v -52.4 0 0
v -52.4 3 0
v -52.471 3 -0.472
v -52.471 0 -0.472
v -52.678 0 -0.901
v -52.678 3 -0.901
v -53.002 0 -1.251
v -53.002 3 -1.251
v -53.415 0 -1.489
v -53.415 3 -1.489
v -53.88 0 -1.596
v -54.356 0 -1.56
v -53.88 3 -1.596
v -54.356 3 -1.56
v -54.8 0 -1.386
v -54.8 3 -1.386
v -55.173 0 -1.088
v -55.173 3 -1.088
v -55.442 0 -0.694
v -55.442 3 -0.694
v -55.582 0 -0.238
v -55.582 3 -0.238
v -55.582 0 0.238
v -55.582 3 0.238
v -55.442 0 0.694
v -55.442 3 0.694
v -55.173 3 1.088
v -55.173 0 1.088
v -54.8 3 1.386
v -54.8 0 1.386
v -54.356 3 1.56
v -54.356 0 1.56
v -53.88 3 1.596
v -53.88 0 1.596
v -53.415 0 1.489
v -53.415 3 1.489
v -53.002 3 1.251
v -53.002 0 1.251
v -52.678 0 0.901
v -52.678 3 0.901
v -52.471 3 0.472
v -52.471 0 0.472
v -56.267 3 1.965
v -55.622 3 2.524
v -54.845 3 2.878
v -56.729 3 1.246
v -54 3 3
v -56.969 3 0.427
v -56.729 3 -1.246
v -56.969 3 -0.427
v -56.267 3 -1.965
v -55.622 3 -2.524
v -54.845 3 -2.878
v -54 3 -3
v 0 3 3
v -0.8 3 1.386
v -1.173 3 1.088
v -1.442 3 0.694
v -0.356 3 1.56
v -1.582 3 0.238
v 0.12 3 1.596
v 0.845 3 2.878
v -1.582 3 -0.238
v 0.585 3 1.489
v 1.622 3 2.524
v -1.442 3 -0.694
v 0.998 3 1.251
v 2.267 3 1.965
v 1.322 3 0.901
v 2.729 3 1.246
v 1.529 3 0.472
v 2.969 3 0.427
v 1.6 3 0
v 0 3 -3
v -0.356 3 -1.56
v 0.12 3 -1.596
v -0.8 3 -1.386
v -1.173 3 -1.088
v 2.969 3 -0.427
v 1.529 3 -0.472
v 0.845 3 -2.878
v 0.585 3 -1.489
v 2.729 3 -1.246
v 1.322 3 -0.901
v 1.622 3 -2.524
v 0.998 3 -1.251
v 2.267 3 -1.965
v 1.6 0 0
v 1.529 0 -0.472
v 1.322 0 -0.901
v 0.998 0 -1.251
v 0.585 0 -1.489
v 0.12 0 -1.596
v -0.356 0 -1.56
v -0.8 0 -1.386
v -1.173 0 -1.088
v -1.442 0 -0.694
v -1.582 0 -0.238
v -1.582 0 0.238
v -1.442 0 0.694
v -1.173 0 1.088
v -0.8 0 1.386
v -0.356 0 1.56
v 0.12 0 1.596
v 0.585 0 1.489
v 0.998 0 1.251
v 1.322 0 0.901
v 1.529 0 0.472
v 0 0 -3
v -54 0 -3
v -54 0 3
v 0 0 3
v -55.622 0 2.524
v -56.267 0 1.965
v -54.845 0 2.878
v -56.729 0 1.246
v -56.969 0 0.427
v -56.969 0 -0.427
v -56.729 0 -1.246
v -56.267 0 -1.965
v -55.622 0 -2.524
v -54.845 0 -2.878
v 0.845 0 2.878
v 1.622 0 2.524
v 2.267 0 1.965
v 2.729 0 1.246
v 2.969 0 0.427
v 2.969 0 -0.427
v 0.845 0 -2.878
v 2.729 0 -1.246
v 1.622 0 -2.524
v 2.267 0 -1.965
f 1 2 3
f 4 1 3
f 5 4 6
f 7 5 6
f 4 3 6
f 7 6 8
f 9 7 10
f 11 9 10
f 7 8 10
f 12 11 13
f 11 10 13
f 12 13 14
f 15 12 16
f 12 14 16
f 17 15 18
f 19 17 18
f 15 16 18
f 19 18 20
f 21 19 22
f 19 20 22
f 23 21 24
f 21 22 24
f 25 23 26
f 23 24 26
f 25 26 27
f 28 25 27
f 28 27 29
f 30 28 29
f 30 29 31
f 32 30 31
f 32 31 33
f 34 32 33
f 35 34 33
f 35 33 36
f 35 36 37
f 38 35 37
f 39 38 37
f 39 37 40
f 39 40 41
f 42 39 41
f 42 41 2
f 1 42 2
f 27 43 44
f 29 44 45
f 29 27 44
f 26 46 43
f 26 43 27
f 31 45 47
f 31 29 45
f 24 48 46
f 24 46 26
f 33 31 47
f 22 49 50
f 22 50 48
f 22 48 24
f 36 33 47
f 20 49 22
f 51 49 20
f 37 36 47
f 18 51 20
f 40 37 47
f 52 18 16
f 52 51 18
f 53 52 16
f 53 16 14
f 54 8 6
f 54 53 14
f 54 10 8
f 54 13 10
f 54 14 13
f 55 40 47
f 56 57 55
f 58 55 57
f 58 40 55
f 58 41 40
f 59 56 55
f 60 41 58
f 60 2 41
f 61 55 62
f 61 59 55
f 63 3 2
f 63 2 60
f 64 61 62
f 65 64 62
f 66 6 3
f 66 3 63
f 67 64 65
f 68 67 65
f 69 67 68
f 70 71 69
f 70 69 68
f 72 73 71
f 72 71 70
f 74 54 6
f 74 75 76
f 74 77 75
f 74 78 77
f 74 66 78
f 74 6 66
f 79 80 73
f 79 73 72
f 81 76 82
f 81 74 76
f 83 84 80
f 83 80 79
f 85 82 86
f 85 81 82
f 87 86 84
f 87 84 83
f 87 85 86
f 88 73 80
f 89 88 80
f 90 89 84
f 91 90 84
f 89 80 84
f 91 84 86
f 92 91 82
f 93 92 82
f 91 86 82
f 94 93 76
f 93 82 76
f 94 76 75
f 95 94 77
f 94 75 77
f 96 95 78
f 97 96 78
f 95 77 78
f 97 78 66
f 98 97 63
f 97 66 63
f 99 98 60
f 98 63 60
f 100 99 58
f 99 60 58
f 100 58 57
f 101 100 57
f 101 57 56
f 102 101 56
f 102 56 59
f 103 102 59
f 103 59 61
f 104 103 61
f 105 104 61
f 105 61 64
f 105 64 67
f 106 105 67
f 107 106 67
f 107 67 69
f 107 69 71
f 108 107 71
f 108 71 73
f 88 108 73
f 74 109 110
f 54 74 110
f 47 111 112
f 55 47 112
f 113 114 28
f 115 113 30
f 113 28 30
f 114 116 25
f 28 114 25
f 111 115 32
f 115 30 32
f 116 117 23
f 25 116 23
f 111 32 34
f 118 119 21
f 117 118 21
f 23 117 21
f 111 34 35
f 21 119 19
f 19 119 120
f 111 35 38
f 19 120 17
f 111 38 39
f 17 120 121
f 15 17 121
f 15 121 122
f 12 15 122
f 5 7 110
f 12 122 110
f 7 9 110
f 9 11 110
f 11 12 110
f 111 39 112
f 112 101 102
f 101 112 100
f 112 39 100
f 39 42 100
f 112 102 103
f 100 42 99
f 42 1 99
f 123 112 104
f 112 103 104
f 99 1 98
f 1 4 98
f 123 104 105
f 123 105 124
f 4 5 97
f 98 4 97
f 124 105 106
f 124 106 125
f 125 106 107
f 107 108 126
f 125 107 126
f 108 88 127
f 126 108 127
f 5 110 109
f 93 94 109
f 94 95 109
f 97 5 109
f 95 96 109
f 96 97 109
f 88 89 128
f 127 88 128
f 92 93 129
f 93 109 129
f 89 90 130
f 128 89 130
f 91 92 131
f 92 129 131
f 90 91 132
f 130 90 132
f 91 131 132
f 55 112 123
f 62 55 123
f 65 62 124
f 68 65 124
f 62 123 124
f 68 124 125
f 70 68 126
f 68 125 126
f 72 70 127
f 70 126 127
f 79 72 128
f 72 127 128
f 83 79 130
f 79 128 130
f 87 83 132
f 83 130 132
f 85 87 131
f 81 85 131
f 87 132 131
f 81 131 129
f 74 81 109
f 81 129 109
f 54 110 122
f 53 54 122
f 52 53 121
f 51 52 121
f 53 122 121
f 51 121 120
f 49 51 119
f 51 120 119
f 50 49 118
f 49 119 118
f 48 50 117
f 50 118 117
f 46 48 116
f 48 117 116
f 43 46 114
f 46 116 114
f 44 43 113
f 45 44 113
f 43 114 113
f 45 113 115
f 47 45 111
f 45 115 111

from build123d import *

# Parameters (mm, degrees)
EXTRUDE_1_DEPTH     = 3
SKETCH_2_R          = 1.6
CUT_EXTRUDE_1_DEPTH = 4


with BuildPart() as part:
    # 草图1 → 凸台-拉伸1 (new body)
    with BuildSketch(Plane(origin=(0, 0, 0), x_dir=(1, 0, 0), z_dir=(0, 1, 0))):
        with BuildLine():
            Line((-54, -3), (0, -3))
            ThreePointArc((0, -3), (3, 0), (0, 3))
            Line((0, 3), (-54, 3))
            ThreePointArc((-54, 3), (-57, 0), (-54, -3))
        make_face()
    extrude(amount=EXTRUDE_1_DEPTH)

    # 草图2 → 切除-拉伸1 (cut, through all)
    with BuildSketch(Plane(origin=(0, 3, 0), x_dir=(1, 0, 0), z_dir=(0, 1, 0))):
        with Locations((-54, 0)):
            Circle(SKETCH_2_R)
        Circle(SKETCH_2_R)
    extrude(amount=-CUT_EXTRUDE_1_DEPTH, mode=Mode.SUBTRACT)


solid = part.part
